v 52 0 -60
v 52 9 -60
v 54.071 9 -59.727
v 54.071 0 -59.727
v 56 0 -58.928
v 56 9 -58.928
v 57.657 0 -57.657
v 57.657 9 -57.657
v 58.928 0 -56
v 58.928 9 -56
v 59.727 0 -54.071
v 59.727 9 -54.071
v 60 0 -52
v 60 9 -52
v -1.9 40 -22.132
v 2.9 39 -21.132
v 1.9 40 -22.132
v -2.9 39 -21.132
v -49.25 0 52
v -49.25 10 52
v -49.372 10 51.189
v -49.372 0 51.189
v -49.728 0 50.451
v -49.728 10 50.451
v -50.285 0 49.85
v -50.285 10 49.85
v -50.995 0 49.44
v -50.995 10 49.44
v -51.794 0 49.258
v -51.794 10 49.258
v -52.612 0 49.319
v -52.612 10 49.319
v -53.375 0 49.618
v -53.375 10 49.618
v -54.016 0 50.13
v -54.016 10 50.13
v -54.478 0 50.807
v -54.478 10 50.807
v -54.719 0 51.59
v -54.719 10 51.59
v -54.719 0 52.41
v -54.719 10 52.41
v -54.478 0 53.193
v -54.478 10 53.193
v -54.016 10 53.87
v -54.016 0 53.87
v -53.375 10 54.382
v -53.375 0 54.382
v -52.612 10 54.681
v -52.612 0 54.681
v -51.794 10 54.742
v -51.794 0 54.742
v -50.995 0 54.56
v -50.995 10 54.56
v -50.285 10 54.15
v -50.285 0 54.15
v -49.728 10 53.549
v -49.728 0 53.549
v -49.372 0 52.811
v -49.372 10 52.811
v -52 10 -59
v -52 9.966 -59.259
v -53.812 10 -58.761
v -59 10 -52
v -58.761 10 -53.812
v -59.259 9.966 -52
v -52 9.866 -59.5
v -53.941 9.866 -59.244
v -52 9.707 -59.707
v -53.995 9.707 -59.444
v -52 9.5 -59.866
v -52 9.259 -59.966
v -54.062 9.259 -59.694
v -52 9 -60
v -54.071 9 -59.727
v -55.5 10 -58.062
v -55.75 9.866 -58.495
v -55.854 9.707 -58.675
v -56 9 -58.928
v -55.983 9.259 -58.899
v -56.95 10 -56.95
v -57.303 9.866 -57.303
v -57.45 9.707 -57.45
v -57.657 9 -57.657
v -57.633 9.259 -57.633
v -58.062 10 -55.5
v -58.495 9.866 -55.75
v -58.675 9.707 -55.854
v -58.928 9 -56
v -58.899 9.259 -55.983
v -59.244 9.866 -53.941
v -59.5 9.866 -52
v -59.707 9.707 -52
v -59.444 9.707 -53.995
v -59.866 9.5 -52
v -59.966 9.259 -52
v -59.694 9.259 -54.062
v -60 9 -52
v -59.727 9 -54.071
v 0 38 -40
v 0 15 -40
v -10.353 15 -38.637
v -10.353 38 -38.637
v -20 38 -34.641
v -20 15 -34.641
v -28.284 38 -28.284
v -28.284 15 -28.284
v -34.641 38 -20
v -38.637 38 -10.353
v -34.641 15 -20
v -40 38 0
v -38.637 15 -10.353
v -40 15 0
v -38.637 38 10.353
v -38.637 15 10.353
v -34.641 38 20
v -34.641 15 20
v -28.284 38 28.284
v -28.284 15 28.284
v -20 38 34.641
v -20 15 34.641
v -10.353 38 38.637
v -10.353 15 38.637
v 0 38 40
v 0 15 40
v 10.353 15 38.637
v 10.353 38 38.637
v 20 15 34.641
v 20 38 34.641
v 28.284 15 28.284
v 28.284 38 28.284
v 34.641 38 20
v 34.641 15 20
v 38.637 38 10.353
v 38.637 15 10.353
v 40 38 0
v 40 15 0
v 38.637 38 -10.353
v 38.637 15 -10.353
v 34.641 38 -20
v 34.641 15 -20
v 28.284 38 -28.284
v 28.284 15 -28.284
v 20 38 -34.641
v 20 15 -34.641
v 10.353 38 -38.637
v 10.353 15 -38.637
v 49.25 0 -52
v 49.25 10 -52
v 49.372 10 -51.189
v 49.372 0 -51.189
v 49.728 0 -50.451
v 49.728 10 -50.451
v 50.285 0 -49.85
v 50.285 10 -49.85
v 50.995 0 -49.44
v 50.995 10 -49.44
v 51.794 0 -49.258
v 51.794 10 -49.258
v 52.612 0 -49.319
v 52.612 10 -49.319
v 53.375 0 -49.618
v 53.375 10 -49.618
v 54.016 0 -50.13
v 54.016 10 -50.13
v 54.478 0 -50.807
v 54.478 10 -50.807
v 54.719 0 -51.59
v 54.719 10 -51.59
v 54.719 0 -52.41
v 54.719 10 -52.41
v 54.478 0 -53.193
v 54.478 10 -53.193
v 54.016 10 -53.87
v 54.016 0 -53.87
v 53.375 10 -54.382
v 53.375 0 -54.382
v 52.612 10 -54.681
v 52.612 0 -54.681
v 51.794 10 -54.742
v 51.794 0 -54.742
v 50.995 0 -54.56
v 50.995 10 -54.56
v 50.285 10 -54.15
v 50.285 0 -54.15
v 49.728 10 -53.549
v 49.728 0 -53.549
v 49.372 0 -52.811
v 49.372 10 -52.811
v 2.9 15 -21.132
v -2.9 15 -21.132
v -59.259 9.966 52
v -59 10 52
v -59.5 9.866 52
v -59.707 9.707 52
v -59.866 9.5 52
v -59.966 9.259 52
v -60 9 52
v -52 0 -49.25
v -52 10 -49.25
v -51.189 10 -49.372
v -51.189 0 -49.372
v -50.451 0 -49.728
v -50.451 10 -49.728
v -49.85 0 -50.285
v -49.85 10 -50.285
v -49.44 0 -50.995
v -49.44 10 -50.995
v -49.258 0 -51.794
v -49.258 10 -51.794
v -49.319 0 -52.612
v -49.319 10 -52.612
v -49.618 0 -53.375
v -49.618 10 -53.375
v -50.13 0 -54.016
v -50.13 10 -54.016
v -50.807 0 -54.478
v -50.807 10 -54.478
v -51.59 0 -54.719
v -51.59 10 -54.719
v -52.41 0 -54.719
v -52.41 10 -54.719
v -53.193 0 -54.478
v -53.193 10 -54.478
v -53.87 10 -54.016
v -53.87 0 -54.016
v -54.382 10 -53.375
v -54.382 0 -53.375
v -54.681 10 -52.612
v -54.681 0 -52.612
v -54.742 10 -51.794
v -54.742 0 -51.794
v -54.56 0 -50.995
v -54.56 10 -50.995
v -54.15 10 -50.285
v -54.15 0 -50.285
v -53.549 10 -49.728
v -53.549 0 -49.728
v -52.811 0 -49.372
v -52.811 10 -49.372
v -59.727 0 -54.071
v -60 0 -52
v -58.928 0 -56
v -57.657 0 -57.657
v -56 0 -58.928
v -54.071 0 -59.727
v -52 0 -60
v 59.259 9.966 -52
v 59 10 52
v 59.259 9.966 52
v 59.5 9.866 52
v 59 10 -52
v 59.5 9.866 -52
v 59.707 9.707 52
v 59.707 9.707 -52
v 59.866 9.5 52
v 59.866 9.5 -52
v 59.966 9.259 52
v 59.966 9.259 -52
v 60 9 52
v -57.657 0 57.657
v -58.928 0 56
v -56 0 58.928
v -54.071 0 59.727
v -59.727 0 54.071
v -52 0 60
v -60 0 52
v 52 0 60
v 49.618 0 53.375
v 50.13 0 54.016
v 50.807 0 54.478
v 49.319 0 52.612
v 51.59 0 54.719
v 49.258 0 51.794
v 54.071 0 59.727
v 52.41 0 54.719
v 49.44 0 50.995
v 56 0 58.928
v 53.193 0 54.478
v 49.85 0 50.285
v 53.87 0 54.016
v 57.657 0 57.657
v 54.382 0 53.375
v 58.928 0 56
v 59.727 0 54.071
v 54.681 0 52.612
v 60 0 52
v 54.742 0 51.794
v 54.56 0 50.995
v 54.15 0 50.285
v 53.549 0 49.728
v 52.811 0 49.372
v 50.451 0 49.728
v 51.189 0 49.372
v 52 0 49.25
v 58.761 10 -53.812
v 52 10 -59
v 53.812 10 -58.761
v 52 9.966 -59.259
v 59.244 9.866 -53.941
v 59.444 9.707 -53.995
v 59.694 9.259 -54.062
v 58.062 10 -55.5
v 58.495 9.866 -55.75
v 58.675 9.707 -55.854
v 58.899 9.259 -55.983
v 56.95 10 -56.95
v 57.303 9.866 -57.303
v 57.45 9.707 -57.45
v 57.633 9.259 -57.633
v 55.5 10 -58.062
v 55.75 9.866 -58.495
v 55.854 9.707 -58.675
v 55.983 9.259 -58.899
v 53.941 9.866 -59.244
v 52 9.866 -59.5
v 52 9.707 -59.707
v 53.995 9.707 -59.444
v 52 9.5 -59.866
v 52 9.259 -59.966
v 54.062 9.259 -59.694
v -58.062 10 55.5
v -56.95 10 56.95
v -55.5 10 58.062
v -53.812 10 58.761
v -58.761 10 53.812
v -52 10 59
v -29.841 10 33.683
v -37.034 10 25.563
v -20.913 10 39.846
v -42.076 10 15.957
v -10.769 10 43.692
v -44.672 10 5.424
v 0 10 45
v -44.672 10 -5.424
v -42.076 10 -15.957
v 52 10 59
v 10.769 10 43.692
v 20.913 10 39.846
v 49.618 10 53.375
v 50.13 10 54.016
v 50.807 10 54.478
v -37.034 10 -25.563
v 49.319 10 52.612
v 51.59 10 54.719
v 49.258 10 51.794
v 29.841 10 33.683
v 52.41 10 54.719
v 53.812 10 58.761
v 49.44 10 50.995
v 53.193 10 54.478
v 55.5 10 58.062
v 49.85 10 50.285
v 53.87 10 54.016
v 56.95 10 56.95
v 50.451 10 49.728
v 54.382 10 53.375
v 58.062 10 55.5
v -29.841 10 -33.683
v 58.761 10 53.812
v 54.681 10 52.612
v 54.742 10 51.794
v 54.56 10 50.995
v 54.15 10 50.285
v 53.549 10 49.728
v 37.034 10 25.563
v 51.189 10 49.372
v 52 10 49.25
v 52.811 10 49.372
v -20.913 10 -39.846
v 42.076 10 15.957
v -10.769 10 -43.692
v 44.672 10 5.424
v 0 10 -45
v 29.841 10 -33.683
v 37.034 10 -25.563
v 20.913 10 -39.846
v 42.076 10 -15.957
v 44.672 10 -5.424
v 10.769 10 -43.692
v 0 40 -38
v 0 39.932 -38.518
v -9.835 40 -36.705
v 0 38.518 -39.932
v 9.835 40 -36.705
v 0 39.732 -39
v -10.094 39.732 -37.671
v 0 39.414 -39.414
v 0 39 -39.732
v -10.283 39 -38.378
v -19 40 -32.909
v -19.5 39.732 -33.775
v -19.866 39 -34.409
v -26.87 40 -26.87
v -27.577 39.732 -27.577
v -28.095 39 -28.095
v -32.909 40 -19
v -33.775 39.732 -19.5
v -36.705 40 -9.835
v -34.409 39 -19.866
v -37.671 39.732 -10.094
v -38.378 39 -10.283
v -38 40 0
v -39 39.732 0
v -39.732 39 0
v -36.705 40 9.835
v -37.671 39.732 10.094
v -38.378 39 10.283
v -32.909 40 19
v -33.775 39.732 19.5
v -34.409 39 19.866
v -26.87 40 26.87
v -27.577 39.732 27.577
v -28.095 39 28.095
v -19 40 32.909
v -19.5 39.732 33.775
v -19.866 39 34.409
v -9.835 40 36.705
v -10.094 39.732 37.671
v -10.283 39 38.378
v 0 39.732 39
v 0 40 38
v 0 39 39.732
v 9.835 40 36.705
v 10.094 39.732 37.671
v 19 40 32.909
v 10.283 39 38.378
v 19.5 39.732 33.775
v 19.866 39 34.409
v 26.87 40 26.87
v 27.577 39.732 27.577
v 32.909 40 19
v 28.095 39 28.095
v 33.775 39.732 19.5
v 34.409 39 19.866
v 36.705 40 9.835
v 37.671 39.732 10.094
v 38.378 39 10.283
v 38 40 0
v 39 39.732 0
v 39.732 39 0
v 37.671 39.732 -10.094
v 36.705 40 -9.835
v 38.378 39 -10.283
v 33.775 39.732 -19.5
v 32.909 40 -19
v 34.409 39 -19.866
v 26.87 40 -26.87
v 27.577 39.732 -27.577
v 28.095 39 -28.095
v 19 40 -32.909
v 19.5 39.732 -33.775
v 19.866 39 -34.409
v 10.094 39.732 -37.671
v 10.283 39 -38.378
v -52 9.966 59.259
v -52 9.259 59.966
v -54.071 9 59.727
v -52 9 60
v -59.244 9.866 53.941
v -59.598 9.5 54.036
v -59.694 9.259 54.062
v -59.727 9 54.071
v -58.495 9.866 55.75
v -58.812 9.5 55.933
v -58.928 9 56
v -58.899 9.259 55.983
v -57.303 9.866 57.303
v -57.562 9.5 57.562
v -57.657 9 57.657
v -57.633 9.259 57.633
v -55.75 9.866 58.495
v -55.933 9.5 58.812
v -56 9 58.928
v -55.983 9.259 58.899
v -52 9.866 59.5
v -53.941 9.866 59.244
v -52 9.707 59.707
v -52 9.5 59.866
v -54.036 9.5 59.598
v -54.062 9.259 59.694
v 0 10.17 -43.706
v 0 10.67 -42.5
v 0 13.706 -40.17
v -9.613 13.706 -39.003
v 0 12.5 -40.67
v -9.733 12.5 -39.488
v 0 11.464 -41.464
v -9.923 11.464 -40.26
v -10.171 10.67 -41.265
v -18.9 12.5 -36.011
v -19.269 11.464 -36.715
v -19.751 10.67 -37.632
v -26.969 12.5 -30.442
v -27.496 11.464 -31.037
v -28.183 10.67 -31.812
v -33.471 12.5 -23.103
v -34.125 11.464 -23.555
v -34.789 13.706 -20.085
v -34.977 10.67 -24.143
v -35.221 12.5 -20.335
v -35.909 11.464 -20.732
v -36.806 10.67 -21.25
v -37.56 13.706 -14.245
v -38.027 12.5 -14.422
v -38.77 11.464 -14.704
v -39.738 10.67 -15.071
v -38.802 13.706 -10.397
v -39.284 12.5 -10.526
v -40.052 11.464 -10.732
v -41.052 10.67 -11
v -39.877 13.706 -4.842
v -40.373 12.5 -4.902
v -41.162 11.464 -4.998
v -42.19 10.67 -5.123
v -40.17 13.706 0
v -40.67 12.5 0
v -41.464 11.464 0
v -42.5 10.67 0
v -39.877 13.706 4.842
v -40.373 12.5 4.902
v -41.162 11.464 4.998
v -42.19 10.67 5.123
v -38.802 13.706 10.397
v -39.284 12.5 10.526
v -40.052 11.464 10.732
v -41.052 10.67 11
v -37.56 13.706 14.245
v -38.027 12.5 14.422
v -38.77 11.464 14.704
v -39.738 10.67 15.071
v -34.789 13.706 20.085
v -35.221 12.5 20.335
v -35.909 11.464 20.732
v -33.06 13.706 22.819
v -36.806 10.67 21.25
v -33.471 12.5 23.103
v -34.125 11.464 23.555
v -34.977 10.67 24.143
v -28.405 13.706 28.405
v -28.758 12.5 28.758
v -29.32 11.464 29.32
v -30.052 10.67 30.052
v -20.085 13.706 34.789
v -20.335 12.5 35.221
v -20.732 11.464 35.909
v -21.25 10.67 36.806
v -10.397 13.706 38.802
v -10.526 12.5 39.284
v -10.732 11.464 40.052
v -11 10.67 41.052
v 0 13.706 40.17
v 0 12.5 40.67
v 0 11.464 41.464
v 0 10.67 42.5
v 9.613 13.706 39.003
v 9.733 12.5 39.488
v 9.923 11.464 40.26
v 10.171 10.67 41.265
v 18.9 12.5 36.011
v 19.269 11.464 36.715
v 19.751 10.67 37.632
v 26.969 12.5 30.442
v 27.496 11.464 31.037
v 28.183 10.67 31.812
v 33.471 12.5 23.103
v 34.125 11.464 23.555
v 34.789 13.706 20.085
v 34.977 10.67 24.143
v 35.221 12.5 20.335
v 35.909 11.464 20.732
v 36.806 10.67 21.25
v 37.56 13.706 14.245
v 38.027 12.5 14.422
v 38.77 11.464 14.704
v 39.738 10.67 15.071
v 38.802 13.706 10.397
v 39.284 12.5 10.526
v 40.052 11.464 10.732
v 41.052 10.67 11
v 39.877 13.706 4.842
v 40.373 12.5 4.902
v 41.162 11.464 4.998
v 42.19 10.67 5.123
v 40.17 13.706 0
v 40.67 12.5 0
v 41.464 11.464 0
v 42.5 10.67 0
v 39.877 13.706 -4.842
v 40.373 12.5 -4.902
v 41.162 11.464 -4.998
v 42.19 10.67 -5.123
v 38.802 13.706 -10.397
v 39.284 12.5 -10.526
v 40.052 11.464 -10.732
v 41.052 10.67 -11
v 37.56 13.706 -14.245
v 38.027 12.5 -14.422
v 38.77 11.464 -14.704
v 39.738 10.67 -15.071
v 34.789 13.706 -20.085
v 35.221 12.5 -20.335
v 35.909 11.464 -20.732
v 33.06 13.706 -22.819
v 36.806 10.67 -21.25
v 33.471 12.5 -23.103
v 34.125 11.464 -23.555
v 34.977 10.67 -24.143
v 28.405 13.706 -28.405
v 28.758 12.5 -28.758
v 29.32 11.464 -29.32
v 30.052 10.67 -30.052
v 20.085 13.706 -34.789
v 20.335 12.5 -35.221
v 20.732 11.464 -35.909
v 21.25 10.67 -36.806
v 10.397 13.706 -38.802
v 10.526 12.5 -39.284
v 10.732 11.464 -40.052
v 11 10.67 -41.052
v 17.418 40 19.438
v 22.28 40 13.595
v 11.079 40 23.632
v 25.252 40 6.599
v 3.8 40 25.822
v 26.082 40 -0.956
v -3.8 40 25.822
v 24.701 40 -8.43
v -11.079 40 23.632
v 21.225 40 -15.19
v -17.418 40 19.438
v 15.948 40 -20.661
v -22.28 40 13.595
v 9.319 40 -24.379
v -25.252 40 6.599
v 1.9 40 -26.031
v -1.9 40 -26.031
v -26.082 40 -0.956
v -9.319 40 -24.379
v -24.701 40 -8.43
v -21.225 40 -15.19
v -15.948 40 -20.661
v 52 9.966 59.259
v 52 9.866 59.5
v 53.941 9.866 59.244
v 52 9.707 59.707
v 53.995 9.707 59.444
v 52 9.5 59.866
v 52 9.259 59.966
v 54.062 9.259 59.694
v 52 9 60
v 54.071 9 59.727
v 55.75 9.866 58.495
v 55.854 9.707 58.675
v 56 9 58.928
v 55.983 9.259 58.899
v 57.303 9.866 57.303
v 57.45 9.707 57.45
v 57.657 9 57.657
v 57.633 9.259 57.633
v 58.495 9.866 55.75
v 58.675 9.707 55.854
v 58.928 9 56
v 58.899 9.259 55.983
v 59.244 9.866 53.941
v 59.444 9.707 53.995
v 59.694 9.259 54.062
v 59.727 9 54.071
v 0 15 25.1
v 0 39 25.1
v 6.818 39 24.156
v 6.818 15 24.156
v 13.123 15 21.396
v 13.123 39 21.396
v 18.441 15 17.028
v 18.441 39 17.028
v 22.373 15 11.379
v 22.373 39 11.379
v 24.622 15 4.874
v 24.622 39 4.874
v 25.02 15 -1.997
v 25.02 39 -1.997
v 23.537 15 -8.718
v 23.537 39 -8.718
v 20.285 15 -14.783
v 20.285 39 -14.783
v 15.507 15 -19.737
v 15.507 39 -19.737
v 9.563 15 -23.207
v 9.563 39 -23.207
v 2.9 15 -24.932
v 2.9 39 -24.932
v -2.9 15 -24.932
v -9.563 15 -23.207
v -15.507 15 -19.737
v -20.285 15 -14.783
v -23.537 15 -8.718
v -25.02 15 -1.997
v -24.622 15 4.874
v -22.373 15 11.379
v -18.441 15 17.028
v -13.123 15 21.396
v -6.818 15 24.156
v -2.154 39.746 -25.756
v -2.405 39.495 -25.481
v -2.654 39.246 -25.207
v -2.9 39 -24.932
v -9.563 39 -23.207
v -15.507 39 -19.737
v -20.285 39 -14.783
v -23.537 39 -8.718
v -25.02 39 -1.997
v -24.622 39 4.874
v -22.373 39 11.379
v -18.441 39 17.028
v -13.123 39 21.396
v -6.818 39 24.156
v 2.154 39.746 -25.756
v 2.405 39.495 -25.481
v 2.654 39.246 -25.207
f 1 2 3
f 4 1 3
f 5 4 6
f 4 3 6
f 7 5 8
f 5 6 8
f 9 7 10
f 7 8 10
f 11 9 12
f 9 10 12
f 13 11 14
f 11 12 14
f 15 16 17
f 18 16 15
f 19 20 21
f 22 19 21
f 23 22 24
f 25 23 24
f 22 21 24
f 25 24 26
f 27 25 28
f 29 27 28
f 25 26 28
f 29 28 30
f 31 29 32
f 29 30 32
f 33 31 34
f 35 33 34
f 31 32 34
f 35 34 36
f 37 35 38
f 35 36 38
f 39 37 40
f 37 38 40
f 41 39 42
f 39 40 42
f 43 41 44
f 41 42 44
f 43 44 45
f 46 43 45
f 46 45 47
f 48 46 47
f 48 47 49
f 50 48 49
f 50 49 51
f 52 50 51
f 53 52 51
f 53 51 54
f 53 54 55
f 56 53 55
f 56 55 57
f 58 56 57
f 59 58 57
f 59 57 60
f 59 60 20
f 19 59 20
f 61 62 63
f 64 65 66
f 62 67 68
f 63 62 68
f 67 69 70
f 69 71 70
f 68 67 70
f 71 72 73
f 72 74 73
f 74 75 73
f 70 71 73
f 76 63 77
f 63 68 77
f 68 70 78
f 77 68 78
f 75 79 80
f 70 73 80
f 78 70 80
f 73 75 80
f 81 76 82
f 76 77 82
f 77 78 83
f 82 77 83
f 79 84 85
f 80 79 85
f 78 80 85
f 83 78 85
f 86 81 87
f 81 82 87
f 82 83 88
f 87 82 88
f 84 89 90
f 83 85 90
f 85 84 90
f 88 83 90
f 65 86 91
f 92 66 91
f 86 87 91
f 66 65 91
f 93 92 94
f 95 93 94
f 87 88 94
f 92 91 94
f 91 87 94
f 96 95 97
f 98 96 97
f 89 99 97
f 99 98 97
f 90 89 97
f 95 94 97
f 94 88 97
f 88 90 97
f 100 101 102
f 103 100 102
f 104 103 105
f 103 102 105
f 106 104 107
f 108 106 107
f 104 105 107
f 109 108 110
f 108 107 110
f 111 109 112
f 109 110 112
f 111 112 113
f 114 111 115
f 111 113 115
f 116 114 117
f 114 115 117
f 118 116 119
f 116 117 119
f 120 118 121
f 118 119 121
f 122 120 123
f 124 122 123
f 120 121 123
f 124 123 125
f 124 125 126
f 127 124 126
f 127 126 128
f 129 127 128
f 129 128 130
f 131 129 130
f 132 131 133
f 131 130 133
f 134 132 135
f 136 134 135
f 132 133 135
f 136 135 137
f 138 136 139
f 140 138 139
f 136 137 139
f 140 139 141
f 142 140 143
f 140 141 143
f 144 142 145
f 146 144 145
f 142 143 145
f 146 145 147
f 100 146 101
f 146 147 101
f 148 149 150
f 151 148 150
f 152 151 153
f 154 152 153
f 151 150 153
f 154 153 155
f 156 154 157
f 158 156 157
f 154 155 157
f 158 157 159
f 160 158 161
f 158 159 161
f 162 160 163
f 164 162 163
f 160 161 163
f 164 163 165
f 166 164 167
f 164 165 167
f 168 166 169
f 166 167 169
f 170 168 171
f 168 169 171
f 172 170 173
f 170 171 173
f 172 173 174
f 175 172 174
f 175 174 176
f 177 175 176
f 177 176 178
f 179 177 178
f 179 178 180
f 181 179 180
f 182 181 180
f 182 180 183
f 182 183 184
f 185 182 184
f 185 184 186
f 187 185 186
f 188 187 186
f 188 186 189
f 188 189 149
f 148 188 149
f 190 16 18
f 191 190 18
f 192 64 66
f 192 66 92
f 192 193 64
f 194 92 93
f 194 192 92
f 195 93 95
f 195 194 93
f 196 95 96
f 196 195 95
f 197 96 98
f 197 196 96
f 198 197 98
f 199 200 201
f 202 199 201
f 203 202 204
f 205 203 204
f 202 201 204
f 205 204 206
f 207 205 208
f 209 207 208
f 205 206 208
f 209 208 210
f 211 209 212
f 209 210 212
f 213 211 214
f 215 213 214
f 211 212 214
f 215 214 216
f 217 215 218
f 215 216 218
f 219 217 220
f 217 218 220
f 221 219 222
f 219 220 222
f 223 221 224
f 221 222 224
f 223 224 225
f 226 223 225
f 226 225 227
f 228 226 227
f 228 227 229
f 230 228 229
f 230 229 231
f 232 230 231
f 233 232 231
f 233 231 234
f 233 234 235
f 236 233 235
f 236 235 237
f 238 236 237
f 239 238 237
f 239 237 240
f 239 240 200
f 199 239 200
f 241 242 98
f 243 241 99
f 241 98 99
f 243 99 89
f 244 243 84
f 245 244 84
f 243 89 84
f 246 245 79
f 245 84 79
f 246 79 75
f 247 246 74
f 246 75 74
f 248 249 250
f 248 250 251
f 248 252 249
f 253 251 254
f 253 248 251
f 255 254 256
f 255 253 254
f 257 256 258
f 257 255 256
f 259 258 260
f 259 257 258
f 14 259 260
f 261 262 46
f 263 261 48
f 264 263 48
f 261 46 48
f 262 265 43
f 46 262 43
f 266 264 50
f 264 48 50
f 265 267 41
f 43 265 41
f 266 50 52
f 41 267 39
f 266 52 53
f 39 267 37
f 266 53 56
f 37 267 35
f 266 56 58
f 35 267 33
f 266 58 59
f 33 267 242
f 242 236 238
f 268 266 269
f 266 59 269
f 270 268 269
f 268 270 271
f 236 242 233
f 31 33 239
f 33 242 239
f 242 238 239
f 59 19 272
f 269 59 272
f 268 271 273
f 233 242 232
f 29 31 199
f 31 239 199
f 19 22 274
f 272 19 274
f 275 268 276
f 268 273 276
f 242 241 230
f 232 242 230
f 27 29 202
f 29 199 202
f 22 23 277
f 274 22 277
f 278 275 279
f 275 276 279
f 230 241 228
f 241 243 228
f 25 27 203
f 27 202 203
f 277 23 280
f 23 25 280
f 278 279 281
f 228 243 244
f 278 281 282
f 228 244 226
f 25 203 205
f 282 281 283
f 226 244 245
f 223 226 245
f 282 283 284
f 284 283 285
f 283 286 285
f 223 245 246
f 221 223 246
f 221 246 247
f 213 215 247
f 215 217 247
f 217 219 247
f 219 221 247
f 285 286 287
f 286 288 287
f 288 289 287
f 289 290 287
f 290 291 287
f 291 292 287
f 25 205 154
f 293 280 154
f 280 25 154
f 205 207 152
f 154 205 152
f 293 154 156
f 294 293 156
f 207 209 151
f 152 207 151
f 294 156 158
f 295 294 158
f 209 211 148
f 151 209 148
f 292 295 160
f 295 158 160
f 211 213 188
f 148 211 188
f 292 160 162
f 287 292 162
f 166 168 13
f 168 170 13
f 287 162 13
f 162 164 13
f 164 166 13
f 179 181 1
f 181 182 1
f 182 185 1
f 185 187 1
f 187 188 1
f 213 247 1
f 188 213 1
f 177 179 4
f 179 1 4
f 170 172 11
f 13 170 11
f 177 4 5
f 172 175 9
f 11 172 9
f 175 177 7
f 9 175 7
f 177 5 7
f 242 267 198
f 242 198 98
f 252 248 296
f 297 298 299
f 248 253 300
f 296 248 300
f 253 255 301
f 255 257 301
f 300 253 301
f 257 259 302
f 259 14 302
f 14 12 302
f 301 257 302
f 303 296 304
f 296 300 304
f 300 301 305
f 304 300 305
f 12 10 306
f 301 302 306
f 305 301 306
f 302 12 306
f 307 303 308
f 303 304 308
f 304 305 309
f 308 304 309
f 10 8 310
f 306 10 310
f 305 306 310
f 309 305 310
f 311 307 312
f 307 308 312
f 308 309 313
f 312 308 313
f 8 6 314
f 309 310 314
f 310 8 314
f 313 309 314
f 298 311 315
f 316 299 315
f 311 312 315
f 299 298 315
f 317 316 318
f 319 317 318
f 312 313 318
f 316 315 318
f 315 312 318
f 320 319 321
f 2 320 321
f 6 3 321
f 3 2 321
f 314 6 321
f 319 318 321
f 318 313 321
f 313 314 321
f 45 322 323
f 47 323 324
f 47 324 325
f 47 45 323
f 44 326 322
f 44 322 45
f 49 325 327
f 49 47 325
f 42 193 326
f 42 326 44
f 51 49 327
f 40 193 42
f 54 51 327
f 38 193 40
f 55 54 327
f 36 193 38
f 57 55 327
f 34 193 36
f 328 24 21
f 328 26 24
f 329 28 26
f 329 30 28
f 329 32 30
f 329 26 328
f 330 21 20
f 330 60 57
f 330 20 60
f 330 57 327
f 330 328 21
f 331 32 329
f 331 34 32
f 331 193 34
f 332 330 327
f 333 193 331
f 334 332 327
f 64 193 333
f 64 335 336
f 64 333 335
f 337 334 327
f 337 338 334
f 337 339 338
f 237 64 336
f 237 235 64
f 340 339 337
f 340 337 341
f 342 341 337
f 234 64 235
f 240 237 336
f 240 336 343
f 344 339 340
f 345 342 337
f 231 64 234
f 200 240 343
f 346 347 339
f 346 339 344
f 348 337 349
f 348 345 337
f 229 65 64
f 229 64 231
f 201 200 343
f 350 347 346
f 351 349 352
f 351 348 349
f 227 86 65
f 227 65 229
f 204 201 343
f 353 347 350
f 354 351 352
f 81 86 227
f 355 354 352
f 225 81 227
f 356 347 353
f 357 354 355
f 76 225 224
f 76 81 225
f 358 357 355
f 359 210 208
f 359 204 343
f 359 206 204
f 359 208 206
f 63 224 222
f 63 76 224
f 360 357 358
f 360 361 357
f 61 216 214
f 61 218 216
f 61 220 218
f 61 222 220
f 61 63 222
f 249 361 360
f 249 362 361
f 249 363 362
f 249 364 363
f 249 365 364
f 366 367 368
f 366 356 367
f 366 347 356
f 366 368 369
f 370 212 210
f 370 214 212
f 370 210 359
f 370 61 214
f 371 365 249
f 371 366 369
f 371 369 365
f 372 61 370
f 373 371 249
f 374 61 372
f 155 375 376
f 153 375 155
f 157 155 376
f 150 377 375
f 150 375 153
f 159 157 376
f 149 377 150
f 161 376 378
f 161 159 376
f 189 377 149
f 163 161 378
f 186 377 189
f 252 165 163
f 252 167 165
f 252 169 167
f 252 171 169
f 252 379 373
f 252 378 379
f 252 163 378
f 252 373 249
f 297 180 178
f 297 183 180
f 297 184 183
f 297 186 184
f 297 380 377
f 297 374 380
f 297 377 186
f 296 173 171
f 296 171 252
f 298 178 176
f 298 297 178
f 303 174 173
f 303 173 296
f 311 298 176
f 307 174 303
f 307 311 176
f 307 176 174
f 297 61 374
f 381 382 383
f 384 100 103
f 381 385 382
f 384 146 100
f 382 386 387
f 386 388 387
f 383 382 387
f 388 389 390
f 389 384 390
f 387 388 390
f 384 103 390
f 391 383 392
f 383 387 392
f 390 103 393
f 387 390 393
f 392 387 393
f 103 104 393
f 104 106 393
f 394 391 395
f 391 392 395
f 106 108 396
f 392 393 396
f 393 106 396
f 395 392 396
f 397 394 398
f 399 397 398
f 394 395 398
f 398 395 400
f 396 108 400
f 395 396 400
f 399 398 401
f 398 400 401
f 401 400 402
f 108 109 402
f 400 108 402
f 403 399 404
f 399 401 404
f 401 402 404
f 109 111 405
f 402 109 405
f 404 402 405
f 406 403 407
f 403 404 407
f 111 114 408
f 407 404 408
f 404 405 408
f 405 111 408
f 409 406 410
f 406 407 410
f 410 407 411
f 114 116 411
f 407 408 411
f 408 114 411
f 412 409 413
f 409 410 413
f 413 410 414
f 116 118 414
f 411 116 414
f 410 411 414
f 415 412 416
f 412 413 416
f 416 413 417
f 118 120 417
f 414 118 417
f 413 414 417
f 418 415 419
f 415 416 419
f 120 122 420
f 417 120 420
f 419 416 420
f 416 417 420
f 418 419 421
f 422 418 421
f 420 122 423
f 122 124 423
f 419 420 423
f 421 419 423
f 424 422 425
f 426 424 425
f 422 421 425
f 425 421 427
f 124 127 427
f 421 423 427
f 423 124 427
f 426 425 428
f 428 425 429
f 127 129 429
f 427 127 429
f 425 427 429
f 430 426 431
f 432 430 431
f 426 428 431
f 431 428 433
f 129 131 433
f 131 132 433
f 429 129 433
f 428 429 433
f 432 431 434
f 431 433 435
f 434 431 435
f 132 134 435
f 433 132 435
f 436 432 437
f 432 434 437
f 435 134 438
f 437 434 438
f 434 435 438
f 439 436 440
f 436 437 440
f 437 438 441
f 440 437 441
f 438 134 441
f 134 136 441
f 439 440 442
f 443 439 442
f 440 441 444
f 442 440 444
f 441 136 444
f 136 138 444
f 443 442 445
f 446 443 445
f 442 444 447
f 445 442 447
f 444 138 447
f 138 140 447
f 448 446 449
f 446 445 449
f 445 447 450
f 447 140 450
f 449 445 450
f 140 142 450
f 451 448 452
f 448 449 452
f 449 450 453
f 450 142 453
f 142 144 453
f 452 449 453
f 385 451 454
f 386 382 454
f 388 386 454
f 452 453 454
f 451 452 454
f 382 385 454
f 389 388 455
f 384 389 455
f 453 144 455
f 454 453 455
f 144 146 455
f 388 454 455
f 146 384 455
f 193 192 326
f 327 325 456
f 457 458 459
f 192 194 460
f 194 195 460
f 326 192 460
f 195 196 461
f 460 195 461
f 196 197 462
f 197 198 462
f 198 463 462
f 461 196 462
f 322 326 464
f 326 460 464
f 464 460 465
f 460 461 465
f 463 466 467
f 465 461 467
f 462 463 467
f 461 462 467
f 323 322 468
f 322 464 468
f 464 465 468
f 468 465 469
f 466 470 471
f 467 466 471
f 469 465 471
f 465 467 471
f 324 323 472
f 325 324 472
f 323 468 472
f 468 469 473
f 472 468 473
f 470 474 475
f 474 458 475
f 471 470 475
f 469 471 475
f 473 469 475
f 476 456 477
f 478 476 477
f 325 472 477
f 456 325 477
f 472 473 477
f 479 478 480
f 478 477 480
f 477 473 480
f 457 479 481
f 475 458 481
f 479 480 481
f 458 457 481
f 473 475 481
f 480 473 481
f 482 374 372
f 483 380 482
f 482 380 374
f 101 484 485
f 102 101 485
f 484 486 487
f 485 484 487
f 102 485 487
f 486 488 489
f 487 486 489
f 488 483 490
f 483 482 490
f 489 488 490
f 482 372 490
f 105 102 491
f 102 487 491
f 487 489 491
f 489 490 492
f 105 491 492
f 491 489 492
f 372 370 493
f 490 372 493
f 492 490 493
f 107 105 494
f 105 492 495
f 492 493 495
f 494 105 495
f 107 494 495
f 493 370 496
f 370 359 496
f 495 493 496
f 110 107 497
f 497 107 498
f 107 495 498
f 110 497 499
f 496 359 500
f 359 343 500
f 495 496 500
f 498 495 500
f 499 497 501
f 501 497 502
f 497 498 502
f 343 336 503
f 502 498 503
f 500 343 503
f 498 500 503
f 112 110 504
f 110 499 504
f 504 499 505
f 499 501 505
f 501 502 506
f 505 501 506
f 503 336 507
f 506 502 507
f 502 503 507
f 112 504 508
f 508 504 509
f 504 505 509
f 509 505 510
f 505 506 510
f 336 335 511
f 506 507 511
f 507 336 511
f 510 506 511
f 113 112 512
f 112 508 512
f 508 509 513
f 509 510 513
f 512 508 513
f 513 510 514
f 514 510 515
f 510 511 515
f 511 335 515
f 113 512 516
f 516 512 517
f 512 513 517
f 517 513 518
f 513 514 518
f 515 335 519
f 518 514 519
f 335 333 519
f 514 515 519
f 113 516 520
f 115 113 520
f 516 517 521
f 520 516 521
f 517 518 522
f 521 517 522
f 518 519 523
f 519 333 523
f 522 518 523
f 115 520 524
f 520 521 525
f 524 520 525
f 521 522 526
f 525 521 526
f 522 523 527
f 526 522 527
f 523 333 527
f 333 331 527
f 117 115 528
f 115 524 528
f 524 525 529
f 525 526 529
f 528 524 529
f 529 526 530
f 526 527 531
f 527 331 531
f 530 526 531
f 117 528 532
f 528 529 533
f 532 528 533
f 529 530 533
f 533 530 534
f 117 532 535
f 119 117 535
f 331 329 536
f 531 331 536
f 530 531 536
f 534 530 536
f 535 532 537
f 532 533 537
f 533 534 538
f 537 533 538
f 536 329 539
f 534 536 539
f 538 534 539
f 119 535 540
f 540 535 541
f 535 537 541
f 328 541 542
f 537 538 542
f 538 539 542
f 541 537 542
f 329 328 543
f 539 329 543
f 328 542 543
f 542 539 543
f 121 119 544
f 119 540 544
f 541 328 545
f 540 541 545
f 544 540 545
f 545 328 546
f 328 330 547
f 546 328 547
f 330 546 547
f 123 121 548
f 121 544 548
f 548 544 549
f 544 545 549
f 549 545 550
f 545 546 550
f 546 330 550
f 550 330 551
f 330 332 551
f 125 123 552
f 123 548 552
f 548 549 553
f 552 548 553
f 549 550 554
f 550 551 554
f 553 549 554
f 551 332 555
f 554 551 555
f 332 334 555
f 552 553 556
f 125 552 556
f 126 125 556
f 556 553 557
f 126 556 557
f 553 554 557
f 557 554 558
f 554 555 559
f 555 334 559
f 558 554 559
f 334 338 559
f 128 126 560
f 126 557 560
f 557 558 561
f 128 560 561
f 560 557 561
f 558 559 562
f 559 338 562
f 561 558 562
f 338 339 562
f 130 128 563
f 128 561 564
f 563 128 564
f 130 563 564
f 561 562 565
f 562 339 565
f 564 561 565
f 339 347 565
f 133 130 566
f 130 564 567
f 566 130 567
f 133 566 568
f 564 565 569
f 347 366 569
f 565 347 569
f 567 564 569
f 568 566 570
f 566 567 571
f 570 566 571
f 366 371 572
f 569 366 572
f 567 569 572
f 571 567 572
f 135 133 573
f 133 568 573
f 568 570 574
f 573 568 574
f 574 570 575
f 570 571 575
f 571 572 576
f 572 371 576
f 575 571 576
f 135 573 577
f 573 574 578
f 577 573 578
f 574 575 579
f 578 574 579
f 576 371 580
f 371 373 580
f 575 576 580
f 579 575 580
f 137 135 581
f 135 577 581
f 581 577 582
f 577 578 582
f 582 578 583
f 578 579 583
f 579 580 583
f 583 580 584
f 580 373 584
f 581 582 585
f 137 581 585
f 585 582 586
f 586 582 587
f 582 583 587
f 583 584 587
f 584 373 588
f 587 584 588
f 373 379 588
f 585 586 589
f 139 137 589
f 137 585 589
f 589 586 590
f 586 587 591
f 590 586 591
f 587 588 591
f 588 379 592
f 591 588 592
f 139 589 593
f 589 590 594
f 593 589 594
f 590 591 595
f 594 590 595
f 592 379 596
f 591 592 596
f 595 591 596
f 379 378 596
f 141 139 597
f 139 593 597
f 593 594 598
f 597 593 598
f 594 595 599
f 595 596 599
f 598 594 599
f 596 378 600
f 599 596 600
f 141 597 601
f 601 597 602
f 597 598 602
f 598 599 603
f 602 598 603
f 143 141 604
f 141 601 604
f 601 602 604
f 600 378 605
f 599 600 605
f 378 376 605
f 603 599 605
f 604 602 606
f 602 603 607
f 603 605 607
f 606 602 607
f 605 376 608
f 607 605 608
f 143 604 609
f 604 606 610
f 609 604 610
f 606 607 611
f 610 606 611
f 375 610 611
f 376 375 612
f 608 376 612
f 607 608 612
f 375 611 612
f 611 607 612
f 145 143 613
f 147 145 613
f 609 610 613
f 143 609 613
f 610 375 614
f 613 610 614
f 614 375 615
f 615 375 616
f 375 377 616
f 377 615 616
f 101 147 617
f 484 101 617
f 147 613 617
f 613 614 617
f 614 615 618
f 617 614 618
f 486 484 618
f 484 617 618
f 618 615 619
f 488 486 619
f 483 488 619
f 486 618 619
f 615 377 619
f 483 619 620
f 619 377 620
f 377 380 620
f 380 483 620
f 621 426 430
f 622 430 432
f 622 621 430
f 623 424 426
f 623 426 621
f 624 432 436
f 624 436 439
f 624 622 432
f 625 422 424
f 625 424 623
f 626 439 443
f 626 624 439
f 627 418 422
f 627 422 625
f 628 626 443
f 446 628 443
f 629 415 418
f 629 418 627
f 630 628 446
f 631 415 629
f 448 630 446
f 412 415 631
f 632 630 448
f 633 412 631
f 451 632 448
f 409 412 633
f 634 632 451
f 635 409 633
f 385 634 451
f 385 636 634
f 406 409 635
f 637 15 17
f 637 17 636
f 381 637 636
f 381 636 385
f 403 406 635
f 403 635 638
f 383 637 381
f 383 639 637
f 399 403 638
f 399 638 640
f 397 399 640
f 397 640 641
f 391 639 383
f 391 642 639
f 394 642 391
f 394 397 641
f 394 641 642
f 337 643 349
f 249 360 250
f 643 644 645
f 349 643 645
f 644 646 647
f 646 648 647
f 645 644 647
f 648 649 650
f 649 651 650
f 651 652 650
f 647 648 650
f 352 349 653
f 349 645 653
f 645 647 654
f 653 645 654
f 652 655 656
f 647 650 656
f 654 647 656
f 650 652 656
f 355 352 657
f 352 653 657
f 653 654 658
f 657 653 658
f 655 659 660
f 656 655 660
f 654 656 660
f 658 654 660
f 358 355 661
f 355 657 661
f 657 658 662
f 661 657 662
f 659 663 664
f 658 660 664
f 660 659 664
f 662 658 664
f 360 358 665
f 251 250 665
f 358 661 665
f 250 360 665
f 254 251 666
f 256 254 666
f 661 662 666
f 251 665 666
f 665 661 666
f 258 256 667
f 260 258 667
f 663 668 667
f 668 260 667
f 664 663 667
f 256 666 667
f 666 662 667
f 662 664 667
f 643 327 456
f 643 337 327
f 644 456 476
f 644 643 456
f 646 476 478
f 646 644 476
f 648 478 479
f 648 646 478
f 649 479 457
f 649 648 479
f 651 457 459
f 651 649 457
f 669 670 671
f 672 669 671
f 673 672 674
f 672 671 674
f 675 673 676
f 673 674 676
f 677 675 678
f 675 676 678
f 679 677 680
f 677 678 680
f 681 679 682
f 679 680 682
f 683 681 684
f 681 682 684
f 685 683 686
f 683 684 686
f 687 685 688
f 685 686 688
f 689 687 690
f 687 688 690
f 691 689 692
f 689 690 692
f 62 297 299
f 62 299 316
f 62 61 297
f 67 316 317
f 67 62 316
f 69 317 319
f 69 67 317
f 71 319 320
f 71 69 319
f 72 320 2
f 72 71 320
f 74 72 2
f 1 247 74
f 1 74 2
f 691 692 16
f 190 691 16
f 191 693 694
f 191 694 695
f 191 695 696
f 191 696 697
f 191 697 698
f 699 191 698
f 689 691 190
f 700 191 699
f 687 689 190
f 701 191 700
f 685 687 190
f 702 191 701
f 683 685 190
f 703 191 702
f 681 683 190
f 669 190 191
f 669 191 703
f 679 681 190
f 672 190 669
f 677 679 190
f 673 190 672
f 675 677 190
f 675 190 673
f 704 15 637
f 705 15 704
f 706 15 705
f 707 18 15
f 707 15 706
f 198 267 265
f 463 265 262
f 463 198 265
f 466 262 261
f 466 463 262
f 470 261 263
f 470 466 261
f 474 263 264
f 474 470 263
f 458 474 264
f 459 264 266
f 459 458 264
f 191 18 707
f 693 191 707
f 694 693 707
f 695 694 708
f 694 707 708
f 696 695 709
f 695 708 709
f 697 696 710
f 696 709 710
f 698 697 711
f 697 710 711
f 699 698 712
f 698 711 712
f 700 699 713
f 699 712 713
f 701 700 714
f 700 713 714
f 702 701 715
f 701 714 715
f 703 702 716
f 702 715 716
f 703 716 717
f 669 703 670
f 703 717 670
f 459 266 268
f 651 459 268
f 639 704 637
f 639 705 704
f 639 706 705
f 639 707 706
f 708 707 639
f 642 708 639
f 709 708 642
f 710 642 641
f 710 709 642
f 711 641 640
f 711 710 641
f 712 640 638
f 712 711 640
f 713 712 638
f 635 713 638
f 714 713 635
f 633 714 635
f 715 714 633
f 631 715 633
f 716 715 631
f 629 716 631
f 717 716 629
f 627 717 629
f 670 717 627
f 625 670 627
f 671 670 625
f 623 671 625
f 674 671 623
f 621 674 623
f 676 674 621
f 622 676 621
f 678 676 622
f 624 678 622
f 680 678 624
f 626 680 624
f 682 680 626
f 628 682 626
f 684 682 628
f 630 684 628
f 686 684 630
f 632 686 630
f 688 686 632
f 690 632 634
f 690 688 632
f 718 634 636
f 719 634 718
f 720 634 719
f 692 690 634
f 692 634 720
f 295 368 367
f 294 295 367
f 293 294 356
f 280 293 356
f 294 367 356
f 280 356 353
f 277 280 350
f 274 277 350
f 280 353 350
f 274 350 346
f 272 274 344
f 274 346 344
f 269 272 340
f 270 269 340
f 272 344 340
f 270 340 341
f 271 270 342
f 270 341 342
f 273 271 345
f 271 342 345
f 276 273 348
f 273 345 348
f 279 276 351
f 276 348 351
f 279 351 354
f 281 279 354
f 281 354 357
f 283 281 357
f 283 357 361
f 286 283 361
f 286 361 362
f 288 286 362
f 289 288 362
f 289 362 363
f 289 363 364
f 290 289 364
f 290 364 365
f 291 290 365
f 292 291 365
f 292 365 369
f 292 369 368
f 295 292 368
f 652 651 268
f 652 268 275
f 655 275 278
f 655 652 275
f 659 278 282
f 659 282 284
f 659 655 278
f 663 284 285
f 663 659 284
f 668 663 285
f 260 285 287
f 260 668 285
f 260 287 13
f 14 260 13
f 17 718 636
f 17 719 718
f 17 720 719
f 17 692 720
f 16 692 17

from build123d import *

# Parameters (mm, degrees)
SKETCH1_W           = 120
SKETCH1_H           = 120
BOSS_EXTRUDE1_DEPTH = 10
SKETCH2_R           = 2.75
CUT_EXTRUDE1_DEPTH  = 86.440037453
CIRPATTERN1_COUNT   = 4
FILLET1_R           = 8
FILLET2_R           = 1
SKETCH3_R           = 40
BOSS_EXTRUDE2_DEPTH = 30
SKETCH4_R           = 25.1
CUT_EXTRUDE2_DEPTH  = 25
BOSS_EXTRUDE3_REACH = 95.808
CHAMFER1_SIZE       = 1
FILLET3_R           = 2
FILLET4_R           = 5


with BuildPart() as part:
    # Sketch1 → Boss-Extrude1 (new body)
    with BuildSketch(Plane(origin=(0, 0, 0), x_dir=(1, 0, 0), z_dir=(0, 1, 0))):
        Rectangle(SKETCH1_W, SKETCH1_H)
    extrude(amount=BOSS_EXTRUDE1_DEPTH)

    # Sketch2 → Cut-Extrude1 (cut, through all)
    with BuildSketch(Plane(origin=(0, 10, 0), x_dir=(1, 0, 0), z_dir=(0, 1, 0))):
        with Locations((-52, 52)):
            Circle(SKETCH2_R)
    cut_extrude1 = extrude(amount=-CUT_EXTRUDE1_DEPTH, mode=Mode.SUBTRACT)

    # CirPattern1: Cut-Extrude1 ×4 about axis
    cirpattern1_axis = Axis((0, 0, 0), (0, 1, 0))
    for i in range(1, CIRPATTERN1_COUNT):
        add(cut_extrude1.rotate(cirpattern1_axis, i * 360 / CIRPATTERN1_COUNT), mode=Mode.SUBTRACT)

    # Fillet1
    fillet1_edges = [part.edges().sort_by_distance(p)[0] for p in [
        (-60, 5, 60),
        (60, 5, 60),
        (60, 5, -60),
        (-60, 5, -60),
    ]]
    fillet(fillet1_edges, radius=FILLET1_R)

    # Fillet2
    fillet2_edges = [part.edges().sort_by_distance(p)[0] for p in [
        (-57.656854249, 10, -57.656854249),
        (0, 10, -60),
        (57.656854249, 10, -57.656854249),
        (60, 10, 0),
        (57.656854249, 10, 57.656854249),
        (0, 10, 60),
        (-57.656854249, 10, 57.656854249),
        (-60, 10, 0),
    ]]
    fillet(fillet2_edges, radius=FILLET2_R)

    # Sketch3 → Boss-Extrude2 (add)
    with BuildSketch(Plane(origin=(0, 10, 0), x_dir=(1, 0, 0), z_dir=(0, 1, 0))):
        Circle(SKETCH3_R)
    extrude(amount=BOSS_EXTRUDE2_DEPTH)

    # Sketch4 → Cut-Extrude2 (cut)
    with BuildSketch(Plane(origin=(0, 40, 0), x_dir=(1, 0, 0), z_dir=(0, 1, 0))):
        Circle(SKETCH4_R)
    extrude(amount=-CUT_EXTRUDE2_DEPTH, mode=Mode.SUBTRACT)

    # Sketch5 → Boss-Extrude3 (add, up to next)
    with BuildSketch(Plane(origin=(0, 40, 0), x_dir=(1, 0, 0), z_dir=(0, 1, 0)), mode=Mode.PRIVATE) as boss_extrude3_sk1:
        with BuildLine():
            Line((2.9, 21.131907268), (-2.9, 21.131907268))
            Line((-2.9, 21.131907268), (-2.9, 24.931907268))
            ThreePointArc((-2.9, 24.931907268), (0, 25.1), (2.9, 24.931907268))
            Line((2.9, 24.931907268), (2.9, 21.131907268))
        make_face()
    boss_extrude3_tool1 = extrude(boss_extrude3_sk1.sketch, amount=-BOSS_EXTRUDE3_REACH, mode=Mode.PRIVATE) - part.part
    add(boss_extrude3_tool1.solids().sort_by_distance((0, 40, -23.088296))[0])

    # Chamfer1
    chamfer1_edges = [part.edges().sort_by_distance(p)[0] for p in [
        (-2.9, 40, -23.031907268),
        (0, 40, -21.131907268),
        (2.9, 40, -23.031907268),
        (0, 40, 25.1),
    ]]
    chamfer(chamfer1_edges, length=CHAMFER1_SIZE)

    # Fillet3
    fillet3_edges = [part.edges().sort_by_distance(p)[0] for p in [
        (-40, 40, 0),
    ]]
    fillet(fillet3_edges, radius=FILLET3_R)

    # Fillet4
    fillet4_edges = [part.edges().sort_by_distance(p)[0] for p in [
        (-40, 10, 0),
    ]]
    fillet(fillet4_edges, radius=FILLET4_R)


solid = part.part
